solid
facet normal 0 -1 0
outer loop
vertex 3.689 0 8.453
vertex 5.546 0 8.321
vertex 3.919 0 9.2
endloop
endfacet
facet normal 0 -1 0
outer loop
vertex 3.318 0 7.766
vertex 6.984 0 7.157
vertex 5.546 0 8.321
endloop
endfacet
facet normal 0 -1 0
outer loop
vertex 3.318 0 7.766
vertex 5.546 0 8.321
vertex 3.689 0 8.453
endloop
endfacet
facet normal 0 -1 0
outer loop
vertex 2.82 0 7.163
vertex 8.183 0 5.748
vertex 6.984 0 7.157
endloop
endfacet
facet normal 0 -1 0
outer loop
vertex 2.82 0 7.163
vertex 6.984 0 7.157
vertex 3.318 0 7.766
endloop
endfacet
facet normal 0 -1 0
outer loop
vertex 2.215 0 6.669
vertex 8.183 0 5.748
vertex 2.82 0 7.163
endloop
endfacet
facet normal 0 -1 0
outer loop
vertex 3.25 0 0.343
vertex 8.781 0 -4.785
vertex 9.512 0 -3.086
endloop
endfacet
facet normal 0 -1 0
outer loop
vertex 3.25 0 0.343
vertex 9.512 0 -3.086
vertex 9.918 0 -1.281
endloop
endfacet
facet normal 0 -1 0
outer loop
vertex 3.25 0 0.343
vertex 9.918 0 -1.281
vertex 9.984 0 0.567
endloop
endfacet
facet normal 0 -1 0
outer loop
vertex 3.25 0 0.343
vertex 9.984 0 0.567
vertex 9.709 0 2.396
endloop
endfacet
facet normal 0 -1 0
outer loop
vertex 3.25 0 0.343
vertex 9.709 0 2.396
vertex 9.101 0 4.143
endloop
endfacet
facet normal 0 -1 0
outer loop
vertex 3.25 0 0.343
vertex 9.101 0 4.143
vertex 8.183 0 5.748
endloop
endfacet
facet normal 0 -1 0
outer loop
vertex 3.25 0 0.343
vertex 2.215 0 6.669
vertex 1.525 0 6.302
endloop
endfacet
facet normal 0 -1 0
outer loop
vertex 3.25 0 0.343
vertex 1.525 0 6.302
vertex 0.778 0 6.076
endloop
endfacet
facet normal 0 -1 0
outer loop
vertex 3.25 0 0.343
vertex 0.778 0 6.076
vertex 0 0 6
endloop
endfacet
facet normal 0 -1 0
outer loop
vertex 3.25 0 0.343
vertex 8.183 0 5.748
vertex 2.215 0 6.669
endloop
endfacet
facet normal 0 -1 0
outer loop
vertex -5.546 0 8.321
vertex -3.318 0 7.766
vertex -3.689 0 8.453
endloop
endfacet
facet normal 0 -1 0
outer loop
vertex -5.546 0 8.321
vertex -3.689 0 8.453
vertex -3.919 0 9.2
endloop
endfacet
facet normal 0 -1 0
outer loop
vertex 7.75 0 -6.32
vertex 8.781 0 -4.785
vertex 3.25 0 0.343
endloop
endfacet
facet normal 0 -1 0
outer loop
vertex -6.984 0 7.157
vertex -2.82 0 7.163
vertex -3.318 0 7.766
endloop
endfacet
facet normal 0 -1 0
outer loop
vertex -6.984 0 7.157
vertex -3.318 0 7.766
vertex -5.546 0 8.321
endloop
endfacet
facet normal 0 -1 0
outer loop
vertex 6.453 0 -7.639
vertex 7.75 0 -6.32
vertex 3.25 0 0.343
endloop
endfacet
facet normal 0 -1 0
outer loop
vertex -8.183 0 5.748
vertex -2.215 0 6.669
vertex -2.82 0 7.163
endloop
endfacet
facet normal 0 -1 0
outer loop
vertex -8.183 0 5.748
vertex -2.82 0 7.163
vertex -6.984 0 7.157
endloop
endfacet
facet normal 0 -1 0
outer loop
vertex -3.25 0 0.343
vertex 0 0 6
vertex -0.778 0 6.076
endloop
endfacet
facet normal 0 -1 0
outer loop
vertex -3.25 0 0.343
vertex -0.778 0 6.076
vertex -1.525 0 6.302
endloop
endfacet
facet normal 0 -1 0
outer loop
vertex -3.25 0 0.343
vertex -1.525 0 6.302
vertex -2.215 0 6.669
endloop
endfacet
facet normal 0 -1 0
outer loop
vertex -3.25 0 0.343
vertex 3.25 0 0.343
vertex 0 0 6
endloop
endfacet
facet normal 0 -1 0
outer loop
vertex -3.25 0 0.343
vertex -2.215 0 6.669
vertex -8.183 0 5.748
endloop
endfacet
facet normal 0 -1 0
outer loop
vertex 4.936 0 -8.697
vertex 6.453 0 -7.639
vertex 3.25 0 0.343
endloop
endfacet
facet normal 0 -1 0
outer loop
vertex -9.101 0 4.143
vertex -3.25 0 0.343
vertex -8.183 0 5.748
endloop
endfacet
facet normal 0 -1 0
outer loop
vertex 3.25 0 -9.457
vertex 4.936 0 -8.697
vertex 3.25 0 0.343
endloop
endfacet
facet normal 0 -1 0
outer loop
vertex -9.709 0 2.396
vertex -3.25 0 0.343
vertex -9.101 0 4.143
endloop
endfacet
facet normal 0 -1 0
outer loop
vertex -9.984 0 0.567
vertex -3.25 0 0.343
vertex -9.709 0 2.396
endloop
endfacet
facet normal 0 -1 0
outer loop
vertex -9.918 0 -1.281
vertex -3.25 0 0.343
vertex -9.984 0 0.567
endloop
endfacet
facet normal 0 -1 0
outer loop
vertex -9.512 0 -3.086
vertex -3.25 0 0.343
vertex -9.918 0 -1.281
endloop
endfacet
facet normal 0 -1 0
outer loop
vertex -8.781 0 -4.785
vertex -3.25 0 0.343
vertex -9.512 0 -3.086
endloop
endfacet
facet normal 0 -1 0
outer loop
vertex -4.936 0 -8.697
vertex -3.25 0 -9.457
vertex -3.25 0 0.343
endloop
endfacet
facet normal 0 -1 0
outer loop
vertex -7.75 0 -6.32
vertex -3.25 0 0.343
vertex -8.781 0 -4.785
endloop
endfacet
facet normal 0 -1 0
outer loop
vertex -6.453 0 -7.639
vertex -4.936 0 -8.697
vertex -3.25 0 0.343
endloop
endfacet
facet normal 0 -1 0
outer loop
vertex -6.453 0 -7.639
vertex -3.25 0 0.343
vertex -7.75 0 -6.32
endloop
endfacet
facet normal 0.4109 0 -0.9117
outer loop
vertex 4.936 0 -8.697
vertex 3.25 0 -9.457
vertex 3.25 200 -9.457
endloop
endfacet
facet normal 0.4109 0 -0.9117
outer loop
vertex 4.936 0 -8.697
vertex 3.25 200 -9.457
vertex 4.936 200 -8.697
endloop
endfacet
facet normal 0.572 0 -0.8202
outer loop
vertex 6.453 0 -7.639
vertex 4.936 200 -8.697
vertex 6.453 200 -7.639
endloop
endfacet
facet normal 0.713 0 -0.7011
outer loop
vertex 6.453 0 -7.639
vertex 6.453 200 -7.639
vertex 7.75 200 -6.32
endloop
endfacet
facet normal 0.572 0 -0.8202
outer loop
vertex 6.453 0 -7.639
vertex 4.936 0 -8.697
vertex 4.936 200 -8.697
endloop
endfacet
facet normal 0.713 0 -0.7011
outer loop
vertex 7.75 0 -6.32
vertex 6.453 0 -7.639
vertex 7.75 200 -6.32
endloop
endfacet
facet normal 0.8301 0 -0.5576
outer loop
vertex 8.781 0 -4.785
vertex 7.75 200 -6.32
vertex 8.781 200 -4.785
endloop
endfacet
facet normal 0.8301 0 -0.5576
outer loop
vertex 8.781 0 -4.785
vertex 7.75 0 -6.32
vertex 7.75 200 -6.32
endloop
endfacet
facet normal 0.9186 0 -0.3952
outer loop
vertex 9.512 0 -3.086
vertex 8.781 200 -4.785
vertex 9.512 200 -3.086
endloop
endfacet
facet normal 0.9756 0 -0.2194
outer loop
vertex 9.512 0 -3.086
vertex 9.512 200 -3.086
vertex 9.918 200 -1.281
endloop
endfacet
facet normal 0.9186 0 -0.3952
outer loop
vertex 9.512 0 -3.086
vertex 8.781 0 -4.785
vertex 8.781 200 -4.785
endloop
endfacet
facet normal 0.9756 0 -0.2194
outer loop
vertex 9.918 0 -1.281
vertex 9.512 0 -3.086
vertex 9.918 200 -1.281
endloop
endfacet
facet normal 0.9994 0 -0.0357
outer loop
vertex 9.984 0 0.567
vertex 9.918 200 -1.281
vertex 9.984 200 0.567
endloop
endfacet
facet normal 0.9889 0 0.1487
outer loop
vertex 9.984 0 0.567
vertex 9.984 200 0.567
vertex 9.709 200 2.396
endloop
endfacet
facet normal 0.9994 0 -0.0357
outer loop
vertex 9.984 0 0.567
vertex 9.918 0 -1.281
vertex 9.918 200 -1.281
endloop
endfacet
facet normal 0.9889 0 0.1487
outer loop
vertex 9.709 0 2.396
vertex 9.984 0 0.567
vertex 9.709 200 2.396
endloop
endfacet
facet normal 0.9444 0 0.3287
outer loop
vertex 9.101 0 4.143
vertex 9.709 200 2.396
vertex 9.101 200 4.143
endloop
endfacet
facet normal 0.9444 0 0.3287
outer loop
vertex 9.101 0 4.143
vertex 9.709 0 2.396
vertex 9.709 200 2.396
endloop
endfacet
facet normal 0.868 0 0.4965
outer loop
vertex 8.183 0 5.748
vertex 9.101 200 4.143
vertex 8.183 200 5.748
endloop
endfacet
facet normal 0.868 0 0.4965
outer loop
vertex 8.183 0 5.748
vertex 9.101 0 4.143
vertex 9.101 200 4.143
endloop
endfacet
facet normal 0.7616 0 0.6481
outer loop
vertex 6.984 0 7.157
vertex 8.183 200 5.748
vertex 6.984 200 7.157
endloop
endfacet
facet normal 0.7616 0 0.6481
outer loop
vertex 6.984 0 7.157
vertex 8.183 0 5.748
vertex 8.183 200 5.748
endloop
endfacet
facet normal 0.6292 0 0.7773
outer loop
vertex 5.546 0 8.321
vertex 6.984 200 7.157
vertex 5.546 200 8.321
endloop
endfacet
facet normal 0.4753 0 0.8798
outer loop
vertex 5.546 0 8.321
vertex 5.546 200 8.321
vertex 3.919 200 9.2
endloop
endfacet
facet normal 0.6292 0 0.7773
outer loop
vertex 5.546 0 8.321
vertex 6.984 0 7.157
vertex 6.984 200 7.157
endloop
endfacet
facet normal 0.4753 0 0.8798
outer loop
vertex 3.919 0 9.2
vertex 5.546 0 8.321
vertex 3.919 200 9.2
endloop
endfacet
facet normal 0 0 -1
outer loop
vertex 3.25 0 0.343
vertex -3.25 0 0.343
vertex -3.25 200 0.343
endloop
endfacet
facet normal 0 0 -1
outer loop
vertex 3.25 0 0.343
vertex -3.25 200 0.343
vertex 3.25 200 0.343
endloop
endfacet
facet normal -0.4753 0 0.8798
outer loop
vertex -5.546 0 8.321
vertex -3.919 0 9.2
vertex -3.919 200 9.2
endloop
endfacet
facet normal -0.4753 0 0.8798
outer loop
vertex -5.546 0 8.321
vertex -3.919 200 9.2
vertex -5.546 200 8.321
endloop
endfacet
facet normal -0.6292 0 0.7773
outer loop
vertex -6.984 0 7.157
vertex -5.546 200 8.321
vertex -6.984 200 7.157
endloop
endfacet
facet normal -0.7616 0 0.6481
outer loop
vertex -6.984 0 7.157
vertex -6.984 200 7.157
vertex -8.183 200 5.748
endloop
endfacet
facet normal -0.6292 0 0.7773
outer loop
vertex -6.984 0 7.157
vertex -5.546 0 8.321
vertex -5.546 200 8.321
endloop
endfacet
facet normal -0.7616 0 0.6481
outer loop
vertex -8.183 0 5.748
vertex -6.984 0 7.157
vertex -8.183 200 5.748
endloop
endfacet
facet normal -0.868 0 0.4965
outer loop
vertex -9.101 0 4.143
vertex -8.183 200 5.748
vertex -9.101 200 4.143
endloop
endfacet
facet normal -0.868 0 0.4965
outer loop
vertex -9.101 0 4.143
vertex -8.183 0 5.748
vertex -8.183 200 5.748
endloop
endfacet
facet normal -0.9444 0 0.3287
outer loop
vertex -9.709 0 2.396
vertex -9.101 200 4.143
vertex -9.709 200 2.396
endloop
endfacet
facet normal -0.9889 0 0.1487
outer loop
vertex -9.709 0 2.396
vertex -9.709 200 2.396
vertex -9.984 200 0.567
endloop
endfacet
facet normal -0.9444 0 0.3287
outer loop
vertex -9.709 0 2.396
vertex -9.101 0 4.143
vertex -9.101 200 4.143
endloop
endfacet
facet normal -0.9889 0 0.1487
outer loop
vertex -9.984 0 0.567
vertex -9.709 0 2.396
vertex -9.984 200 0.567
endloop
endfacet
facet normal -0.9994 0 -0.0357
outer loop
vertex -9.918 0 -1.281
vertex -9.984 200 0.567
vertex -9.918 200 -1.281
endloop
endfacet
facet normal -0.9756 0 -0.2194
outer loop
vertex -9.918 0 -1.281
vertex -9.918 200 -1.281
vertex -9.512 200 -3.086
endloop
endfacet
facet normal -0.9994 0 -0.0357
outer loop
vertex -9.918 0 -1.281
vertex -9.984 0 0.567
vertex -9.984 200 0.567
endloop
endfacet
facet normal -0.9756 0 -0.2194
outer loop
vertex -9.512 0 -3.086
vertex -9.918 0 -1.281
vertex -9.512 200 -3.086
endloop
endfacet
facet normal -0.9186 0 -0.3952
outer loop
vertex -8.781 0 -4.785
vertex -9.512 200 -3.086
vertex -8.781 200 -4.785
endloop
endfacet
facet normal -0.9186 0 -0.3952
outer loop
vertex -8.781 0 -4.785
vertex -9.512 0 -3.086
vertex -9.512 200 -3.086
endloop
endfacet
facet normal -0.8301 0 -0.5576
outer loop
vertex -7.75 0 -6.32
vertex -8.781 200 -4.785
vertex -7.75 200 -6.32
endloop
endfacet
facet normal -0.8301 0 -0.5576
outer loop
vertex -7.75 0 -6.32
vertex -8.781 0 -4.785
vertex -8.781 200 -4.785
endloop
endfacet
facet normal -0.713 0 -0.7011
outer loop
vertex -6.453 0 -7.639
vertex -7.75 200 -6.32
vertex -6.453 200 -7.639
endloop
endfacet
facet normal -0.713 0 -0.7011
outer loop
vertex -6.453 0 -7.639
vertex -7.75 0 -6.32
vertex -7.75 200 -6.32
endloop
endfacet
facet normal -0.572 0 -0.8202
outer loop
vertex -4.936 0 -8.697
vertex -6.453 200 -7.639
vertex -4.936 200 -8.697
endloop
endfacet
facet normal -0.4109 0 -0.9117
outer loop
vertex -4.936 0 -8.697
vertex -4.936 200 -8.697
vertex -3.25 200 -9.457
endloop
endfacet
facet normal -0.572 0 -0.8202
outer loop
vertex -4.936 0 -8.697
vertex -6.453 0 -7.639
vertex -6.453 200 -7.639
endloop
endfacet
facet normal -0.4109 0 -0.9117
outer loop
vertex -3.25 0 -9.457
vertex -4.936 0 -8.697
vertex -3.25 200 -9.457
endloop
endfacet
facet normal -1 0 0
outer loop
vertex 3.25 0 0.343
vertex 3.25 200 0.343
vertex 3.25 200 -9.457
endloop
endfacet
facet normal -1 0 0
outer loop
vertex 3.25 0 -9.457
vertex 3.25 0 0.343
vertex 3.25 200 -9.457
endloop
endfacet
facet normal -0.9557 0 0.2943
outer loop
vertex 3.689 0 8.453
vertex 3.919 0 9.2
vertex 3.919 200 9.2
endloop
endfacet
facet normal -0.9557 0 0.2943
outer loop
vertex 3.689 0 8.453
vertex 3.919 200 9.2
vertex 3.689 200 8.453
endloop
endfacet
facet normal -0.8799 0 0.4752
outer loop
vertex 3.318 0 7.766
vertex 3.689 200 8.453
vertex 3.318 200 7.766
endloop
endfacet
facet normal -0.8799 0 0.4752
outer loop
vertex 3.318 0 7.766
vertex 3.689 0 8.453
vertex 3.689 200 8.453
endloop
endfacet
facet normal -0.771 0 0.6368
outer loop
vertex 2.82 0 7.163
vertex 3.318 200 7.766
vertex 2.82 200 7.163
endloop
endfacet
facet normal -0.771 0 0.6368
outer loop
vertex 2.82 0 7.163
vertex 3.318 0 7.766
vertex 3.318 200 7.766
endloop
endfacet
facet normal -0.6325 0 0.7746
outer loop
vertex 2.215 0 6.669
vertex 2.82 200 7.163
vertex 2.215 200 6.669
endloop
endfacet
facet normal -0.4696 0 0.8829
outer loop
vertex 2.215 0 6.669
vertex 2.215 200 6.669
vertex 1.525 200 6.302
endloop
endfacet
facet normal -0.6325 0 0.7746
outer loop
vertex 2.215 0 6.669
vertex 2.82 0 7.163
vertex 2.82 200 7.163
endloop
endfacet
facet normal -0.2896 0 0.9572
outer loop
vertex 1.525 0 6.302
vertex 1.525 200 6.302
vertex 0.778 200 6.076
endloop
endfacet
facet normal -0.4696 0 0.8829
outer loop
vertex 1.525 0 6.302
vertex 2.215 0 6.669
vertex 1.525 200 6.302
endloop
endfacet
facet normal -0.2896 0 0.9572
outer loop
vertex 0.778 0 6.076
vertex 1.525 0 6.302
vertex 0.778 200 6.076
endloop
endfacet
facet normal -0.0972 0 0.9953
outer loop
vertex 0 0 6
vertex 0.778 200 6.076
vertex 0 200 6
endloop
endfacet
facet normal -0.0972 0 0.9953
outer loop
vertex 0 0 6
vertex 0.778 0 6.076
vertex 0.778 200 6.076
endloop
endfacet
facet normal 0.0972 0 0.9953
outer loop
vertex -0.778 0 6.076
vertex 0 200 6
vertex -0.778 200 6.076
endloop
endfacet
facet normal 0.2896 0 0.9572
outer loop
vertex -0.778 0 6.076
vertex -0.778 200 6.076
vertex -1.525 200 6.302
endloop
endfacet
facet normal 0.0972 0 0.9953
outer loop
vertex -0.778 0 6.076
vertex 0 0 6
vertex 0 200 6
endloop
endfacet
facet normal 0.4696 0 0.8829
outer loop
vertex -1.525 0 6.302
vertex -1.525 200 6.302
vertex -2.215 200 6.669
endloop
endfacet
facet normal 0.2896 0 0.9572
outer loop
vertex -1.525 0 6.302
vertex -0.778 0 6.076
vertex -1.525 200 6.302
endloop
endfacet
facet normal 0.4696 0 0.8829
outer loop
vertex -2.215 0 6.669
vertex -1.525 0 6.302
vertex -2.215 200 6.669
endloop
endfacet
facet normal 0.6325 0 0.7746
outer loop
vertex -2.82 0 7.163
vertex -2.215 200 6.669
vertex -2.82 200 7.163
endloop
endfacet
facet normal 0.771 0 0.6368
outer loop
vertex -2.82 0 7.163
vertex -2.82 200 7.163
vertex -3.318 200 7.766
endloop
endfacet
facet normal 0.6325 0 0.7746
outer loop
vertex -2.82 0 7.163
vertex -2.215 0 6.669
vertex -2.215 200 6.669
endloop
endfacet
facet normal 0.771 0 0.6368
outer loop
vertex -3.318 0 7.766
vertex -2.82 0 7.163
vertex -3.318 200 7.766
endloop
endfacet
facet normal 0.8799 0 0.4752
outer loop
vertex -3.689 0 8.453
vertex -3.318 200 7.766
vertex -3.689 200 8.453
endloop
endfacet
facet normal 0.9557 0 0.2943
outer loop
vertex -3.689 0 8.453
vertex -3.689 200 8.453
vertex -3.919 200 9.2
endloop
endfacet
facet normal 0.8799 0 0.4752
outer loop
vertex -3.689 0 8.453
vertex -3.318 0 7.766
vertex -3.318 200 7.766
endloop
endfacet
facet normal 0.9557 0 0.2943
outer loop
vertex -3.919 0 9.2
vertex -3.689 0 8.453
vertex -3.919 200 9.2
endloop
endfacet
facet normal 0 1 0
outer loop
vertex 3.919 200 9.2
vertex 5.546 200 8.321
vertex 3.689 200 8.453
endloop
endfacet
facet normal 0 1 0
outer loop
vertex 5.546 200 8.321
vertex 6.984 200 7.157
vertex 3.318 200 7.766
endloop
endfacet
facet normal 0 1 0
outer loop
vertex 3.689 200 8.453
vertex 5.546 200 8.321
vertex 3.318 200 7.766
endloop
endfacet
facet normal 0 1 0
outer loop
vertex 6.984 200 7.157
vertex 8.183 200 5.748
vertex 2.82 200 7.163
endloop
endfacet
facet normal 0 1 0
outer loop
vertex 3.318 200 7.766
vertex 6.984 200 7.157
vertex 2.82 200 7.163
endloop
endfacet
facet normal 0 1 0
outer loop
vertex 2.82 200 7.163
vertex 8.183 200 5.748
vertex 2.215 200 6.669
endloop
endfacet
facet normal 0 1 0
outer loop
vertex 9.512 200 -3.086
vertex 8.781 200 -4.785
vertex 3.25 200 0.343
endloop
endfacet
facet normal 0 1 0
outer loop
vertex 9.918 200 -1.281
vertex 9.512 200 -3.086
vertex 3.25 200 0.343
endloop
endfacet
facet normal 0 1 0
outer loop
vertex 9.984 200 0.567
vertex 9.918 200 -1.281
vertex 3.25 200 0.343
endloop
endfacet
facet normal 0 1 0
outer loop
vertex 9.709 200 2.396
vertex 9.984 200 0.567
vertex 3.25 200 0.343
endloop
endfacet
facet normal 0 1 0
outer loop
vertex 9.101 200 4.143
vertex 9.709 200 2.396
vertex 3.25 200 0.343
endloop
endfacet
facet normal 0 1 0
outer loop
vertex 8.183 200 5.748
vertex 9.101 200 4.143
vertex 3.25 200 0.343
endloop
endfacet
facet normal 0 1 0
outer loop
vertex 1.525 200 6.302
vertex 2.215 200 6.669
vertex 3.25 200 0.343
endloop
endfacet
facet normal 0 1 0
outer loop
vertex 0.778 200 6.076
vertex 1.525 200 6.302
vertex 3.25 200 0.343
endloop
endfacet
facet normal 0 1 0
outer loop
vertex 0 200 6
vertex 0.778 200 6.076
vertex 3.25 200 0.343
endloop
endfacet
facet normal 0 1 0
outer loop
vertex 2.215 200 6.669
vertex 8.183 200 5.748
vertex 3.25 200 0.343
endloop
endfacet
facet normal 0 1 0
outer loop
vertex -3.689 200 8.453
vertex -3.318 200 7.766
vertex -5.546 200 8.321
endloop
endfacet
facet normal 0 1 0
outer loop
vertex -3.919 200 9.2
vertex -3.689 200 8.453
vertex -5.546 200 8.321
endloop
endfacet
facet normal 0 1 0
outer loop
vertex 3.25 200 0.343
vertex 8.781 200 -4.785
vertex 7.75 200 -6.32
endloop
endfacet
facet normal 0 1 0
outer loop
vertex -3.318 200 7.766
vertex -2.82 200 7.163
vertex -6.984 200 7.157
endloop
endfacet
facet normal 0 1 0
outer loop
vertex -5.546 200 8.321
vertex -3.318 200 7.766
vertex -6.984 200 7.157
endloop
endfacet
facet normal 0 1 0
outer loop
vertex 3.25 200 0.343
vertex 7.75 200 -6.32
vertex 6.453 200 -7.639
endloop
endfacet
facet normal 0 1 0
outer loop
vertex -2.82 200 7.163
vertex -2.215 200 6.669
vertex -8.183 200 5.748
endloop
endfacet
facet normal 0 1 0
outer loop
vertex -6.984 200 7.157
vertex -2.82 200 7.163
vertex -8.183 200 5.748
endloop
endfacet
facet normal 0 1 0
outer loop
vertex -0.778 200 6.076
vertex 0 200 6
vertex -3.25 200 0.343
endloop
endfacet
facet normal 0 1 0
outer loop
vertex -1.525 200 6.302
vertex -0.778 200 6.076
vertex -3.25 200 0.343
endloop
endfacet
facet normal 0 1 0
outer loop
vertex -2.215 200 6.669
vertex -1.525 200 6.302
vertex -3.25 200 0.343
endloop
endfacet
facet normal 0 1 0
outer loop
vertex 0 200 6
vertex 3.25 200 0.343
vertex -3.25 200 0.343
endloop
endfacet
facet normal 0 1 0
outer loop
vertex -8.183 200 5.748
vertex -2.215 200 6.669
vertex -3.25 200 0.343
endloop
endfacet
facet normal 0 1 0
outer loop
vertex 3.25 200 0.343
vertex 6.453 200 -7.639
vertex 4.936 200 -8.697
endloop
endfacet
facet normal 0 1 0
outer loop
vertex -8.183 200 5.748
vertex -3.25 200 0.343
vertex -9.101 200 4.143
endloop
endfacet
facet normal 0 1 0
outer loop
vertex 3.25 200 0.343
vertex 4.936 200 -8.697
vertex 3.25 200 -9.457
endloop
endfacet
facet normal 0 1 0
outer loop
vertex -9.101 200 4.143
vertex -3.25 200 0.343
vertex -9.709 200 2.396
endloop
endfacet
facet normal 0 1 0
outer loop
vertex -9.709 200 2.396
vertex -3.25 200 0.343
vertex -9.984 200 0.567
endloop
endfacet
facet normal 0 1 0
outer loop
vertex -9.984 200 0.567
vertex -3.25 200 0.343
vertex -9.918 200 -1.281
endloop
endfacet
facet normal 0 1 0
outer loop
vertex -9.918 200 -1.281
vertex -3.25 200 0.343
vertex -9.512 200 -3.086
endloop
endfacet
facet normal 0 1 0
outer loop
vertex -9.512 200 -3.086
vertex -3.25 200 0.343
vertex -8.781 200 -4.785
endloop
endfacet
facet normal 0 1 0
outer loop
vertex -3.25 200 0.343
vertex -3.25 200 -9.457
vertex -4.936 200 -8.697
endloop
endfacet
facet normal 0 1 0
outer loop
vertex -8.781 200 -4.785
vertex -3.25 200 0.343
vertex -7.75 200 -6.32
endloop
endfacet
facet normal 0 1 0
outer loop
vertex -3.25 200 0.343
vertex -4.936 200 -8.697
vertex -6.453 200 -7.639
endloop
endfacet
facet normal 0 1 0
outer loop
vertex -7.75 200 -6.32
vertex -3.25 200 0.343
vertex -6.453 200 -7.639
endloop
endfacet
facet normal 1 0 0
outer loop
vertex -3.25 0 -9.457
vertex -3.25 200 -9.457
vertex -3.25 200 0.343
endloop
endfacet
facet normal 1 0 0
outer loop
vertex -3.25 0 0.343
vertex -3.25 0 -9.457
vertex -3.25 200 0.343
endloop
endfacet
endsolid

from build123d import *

# Parameters (mm, degrees)
RESSALTO_EXTRUS_O1_DEPTH = 200


with BuildPart() as part:
    # Esboço1 → Ressalto-extrusão1 (new body)
    with BuildSketch(Plane(origin=(0, 0, 0), x_dir=(1, 0, 0), z_dir=(0, 1, 0))):
        with BuildLine():
            Line((-3.25, -0.34285984), (3.25, -0.34285984))
            Line((3.25, -0.34285984), (3.25, 9.45714016))
            ThreePointArc((3.25, 9.45714016), (9.993573839, 0.358443767), (3.919183588, -9.2))
            ThreePointArc((3.919183588, -9.2), (0, -6), (-3.919183588, -9.2))
            ThreePointArc((-3.919183588, -9.2), (-9.993573839, 0.358443767), (-3.25, 9.45714016))
            Line((-3.25, 9.45714016), (-3.25, -0.34285984))
        make_face()
    extrude(amount=RESSALTO_EXTRUS_O1_DEPTH)


solid = part.part
